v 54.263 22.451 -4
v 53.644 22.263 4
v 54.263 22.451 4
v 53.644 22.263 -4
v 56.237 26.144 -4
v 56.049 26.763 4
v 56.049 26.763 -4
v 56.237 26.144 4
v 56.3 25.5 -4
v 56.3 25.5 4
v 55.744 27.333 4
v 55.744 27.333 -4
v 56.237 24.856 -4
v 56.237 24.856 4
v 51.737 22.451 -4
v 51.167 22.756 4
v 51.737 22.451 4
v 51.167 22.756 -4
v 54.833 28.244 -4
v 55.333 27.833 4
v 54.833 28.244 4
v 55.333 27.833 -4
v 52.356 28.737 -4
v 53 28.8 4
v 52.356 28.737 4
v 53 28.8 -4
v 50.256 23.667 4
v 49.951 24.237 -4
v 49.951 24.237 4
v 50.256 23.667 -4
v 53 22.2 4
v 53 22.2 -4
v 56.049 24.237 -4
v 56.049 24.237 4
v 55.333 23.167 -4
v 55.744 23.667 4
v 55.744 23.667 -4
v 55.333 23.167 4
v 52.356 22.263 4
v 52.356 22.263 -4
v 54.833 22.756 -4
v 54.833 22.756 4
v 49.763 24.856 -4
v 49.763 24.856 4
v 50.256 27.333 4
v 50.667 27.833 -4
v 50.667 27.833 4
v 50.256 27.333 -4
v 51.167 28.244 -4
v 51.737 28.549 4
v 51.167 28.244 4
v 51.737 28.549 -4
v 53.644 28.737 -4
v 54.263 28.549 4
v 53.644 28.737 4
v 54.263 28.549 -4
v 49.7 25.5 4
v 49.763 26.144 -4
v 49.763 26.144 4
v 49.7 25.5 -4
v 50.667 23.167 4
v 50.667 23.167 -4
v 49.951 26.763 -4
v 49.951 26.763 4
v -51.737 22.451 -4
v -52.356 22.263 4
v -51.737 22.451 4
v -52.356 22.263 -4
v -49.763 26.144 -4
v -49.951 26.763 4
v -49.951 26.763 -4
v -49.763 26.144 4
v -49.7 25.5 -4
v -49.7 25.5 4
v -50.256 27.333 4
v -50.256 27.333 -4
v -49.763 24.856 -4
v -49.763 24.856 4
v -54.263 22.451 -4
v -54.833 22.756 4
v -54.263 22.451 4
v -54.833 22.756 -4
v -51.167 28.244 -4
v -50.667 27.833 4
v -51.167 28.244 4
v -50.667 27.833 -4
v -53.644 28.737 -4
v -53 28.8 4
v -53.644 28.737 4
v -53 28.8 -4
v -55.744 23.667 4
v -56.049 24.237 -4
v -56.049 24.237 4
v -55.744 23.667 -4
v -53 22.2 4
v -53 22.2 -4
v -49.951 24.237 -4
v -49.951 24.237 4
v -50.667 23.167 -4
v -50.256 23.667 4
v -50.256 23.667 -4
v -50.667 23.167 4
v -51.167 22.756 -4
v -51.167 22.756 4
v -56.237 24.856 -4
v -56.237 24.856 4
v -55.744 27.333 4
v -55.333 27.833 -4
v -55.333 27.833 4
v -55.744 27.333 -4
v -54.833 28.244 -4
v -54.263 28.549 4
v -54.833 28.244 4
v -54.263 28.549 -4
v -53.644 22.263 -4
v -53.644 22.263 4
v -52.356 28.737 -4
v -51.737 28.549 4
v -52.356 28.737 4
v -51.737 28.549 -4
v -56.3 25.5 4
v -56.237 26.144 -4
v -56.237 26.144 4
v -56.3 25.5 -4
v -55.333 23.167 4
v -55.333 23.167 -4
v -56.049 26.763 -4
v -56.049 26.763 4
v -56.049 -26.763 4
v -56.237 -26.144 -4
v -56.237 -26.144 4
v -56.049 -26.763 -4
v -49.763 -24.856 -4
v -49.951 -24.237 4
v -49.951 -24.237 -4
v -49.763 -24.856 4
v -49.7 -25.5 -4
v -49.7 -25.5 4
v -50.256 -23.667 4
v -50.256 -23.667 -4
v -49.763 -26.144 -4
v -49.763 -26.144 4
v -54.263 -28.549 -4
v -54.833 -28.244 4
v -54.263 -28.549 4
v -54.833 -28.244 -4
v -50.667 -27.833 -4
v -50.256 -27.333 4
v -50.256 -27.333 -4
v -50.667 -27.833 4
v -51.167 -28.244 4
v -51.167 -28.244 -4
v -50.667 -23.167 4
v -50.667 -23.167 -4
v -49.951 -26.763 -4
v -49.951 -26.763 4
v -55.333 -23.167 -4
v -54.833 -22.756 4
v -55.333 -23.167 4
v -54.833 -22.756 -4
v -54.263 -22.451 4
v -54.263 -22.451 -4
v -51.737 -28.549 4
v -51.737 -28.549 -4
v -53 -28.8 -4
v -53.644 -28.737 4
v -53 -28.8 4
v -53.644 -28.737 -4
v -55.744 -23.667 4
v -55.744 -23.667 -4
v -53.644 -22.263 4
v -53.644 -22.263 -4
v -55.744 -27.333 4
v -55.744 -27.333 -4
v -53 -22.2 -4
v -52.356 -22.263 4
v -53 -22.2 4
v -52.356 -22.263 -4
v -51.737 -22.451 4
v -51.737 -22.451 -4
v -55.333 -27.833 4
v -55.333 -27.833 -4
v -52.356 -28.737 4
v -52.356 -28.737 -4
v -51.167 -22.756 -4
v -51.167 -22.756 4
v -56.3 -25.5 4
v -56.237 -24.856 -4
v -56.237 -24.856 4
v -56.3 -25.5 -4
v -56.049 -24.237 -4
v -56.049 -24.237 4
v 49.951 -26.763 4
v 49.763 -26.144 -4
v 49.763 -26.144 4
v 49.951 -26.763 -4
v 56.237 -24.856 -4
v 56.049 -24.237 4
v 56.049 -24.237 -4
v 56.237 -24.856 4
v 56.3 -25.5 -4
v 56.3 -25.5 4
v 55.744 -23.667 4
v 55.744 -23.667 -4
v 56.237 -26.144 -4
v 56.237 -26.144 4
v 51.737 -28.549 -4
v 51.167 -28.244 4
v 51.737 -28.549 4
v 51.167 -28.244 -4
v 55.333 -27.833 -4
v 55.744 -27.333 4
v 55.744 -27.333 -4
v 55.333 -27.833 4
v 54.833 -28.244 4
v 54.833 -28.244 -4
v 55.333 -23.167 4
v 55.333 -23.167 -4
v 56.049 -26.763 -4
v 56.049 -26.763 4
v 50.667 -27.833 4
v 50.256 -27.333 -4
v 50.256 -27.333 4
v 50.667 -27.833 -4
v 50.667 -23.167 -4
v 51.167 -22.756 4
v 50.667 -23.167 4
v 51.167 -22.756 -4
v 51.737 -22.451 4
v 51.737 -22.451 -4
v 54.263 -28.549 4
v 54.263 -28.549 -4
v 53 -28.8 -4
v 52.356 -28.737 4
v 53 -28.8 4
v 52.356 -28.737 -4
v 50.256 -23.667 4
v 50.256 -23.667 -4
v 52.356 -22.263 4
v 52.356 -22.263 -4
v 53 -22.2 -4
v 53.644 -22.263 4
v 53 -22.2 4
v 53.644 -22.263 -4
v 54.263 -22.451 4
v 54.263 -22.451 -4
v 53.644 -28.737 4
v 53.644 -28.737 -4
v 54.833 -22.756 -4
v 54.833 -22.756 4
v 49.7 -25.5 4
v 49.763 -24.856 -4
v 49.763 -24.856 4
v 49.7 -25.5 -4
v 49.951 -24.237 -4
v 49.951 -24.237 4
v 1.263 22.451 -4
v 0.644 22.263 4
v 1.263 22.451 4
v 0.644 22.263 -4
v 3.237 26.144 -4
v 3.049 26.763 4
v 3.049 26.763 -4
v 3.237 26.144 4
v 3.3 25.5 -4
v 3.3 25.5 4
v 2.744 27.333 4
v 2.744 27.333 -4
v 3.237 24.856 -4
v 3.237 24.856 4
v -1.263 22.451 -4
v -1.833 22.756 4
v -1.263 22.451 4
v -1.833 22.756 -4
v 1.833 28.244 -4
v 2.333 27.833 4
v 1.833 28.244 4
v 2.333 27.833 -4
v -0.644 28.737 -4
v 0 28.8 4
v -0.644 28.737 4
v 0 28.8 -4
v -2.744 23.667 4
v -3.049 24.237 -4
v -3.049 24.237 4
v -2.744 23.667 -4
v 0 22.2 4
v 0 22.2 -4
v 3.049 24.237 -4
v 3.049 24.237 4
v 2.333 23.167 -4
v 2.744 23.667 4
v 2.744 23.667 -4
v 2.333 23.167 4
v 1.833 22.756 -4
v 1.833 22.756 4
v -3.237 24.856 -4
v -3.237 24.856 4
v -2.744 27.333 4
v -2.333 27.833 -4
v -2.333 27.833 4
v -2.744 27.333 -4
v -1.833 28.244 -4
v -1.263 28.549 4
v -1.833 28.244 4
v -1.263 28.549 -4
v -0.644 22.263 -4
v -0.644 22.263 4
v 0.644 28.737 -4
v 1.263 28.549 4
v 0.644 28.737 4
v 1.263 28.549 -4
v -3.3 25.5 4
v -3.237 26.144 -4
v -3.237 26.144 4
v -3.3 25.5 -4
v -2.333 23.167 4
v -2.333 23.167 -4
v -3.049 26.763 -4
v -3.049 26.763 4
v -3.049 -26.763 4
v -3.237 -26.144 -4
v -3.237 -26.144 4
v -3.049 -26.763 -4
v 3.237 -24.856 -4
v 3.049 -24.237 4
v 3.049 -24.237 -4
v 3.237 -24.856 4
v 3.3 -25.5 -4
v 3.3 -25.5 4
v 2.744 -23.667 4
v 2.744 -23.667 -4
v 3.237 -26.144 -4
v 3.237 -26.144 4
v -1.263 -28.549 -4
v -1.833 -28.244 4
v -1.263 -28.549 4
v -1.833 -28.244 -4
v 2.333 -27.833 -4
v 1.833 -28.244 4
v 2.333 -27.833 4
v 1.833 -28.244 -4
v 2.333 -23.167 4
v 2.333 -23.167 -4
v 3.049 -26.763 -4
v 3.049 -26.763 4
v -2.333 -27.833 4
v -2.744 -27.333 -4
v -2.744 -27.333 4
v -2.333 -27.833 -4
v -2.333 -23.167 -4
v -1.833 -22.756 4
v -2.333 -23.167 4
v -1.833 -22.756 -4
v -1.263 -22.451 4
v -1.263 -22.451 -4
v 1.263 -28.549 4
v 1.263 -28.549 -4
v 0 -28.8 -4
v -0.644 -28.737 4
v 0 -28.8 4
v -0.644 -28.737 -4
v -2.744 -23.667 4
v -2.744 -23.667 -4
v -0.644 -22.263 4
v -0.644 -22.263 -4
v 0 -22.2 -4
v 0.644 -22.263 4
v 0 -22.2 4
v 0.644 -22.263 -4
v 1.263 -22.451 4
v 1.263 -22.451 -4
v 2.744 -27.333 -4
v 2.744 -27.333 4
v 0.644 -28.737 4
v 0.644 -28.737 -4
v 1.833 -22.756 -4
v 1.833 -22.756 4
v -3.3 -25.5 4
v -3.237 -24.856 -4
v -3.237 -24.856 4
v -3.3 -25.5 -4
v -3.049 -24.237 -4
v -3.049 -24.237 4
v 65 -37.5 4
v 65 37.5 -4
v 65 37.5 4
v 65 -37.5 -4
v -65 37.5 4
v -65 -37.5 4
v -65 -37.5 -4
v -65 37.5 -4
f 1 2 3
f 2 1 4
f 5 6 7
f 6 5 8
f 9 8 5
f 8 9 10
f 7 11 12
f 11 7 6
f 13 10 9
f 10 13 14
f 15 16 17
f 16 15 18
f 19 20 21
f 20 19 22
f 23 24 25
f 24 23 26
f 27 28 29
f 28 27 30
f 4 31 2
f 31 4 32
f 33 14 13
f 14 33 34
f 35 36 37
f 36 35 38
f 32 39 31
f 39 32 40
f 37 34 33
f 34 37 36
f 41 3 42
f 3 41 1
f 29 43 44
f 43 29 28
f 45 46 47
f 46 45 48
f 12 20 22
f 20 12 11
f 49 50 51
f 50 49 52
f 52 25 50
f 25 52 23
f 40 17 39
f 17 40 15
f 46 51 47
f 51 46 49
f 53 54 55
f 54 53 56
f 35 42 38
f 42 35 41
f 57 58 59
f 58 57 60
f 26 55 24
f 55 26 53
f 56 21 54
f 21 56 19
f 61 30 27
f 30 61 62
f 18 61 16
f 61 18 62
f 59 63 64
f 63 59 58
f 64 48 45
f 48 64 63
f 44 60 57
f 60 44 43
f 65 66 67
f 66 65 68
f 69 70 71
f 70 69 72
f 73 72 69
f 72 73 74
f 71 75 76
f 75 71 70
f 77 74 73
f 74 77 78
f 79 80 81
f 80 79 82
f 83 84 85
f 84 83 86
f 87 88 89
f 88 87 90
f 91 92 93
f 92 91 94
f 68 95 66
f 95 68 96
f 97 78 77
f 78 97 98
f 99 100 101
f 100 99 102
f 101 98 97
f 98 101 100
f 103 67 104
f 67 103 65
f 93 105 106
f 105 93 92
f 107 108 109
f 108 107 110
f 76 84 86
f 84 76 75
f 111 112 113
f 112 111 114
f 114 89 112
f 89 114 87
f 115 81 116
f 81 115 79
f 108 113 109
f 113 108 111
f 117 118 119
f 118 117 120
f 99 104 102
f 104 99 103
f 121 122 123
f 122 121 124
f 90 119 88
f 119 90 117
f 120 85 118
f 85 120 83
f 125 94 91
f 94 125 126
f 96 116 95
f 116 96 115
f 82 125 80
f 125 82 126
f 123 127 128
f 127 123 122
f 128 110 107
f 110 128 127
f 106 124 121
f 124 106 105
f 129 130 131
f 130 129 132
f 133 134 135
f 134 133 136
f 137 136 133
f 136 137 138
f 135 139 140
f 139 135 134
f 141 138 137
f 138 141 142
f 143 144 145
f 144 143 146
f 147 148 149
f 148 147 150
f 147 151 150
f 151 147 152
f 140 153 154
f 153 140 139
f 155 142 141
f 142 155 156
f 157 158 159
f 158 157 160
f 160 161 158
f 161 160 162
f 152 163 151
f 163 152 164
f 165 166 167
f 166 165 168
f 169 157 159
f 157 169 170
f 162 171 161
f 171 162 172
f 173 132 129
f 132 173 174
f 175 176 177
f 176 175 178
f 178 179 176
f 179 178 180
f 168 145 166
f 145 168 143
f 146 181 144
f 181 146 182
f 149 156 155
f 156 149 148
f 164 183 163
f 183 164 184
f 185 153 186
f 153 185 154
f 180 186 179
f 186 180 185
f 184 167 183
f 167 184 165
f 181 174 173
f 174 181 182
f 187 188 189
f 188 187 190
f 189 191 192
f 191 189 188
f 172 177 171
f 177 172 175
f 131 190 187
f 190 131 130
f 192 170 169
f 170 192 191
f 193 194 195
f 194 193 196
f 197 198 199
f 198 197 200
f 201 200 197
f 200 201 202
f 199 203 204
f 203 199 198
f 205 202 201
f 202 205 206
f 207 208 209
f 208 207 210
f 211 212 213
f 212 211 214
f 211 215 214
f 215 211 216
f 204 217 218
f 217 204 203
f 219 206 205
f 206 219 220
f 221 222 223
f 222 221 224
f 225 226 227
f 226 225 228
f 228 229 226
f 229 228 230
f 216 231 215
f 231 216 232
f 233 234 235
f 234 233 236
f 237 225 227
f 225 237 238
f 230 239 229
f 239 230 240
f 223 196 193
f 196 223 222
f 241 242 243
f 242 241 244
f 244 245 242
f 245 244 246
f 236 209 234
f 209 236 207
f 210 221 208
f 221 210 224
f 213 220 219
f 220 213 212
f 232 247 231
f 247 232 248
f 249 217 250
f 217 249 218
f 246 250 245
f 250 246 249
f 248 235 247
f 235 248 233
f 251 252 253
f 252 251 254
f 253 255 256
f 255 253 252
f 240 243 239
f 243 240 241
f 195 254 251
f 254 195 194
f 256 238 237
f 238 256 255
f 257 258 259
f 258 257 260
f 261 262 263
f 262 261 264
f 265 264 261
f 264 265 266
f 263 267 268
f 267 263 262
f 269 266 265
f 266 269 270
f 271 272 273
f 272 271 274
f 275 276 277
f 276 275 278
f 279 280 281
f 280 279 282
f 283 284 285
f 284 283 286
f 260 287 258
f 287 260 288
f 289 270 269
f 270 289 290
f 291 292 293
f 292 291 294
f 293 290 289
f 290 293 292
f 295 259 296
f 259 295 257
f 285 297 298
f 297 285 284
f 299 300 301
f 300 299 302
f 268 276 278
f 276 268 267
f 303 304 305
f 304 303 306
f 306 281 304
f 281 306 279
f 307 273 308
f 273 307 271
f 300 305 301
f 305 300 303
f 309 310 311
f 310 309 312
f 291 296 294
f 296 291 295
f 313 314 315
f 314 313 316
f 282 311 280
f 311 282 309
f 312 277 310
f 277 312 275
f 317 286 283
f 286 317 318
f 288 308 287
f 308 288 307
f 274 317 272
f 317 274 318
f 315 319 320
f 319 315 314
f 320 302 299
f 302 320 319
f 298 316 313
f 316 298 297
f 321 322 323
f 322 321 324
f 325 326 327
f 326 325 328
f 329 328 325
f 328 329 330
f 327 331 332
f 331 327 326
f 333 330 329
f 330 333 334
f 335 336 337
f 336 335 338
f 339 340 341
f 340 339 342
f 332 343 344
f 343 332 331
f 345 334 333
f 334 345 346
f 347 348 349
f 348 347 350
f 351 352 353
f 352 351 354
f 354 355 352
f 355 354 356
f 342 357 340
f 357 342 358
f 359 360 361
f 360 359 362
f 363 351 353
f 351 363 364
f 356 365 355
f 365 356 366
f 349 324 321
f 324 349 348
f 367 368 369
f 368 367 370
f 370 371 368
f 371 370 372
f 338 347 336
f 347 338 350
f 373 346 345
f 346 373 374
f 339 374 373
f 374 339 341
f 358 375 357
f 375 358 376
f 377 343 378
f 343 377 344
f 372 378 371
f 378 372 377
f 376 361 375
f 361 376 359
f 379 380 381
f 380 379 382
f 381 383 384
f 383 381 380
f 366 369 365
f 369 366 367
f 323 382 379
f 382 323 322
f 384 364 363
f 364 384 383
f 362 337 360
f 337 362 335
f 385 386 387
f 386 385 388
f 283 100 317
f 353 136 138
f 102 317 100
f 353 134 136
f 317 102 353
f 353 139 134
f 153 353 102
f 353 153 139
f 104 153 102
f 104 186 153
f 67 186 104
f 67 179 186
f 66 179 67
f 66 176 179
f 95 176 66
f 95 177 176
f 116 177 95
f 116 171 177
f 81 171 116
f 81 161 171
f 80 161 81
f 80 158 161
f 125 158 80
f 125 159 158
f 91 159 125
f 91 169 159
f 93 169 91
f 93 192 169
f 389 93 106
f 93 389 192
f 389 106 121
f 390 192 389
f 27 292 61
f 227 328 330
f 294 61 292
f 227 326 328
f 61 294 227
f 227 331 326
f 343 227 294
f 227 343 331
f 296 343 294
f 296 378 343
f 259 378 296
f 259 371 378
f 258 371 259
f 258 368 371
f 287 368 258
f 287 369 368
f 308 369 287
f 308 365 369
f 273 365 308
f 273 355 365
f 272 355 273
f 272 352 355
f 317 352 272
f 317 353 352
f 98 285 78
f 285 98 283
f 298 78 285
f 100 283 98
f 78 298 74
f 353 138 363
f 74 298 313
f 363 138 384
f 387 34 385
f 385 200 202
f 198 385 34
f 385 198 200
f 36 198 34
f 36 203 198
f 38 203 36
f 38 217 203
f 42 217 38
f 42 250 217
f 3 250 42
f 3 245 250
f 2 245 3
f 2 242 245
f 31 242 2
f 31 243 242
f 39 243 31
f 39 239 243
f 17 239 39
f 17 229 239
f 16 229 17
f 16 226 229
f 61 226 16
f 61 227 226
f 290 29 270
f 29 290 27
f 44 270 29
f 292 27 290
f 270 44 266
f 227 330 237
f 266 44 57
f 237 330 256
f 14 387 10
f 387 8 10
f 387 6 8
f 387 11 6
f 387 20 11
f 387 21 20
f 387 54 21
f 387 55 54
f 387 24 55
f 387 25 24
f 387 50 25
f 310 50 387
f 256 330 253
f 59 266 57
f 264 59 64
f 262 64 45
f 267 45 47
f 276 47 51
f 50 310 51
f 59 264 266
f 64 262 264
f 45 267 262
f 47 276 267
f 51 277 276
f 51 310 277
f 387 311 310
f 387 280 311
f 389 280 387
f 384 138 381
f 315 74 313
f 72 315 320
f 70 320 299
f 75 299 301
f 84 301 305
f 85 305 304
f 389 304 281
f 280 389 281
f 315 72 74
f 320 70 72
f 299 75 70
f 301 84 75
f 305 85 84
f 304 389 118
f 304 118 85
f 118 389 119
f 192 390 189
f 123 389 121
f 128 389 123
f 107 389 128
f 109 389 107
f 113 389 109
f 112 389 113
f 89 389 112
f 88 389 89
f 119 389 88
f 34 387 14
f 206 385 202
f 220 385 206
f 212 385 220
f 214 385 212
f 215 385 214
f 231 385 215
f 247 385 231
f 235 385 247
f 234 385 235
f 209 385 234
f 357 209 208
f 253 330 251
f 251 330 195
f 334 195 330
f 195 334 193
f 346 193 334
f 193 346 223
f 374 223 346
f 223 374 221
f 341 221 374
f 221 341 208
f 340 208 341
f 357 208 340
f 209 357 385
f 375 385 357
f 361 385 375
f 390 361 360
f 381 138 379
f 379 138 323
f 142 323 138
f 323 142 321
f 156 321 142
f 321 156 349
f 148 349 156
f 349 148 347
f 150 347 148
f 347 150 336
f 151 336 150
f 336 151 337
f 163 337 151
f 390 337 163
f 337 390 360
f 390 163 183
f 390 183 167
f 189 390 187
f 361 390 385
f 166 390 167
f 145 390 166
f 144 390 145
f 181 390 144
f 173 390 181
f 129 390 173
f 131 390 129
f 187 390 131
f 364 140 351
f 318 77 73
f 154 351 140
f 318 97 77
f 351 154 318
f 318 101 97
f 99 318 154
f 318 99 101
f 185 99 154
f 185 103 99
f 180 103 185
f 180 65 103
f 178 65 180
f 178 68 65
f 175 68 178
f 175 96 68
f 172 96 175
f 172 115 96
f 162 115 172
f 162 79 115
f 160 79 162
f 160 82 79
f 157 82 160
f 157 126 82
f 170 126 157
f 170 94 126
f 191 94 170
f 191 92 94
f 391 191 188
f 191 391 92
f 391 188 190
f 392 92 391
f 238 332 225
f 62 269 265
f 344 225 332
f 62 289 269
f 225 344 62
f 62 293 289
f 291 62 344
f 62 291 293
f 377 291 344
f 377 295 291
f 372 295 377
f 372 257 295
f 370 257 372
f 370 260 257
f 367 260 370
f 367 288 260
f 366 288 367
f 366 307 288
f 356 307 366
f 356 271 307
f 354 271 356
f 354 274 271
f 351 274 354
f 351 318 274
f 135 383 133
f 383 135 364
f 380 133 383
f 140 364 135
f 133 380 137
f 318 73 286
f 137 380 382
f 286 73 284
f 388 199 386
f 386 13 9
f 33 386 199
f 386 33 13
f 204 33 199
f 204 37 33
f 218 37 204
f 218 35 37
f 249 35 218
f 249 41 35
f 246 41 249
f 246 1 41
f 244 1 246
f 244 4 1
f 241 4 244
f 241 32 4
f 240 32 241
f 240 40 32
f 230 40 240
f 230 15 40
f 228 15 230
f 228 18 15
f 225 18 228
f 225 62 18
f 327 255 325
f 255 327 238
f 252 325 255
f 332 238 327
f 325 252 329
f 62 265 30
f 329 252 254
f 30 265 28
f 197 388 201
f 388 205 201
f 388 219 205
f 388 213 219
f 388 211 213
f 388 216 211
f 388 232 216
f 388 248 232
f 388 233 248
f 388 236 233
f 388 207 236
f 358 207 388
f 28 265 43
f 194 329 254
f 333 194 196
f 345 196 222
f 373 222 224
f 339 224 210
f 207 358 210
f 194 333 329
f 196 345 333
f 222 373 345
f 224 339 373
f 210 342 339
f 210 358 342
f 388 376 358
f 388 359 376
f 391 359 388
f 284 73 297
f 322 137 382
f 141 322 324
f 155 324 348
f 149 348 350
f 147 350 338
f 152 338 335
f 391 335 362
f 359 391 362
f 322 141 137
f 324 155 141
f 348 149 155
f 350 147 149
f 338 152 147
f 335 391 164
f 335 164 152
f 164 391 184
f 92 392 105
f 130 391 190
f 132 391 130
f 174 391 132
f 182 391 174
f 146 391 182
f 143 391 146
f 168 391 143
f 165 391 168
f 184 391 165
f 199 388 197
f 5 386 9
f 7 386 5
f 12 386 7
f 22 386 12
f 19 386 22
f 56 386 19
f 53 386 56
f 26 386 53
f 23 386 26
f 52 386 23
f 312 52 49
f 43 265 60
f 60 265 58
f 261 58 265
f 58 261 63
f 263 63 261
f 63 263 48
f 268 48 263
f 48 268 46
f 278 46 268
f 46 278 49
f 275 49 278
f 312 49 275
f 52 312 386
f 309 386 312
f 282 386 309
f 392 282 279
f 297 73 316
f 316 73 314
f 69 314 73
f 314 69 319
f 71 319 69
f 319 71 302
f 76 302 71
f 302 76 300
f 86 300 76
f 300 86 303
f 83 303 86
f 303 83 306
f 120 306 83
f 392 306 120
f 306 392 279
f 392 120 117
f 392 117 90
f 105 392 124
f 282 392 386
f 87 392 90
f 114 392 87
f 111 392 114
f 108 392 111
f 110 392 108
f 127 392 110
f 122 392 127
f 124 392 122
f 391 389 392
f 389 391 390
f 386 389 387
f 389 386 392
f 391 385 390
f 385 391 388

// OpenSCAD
$fn = 32;

// ----------------------------------------------------------------------
// Corner plate 130 x 75 x 8
// 6 holes, centres taken from the edge offset
// ----------------------------------------------------------------------

// --- parameters (mm) ---
plate = [130, 75, 8];  // overall size (x, y, z)
holes = 6;             // number of holes the drawing asks for
hole_d = 6.6;          // hole diameter
edge = 12;             // hole centre offset from the plate edge

// --- derived feature positions (mm) ---
corner_x = plate[0] / 2 - edge;  // = 53   corner hole X
corner_y = plate[1] / 2 - edge;  // = 25.5   corner hole Y
feature_centers = [
  [corner_x, corner_y],
  [-corner_x, corner_y],
  [-corner_x, -corner_y],
  [corner_x, -corner_y],
  [0, corner_y],
  [0, -corner_y]
];   // hole centres the loop below drills

// plate outline, every hole drilled through with the same cutters
difference() {
  cube(plate, center = true);
  for (centre = feature_centers)
    translate([centre[0], centre[1], 0])
      cylinder(d = hole_d, h = plate[2] + 2, center = true);
}
